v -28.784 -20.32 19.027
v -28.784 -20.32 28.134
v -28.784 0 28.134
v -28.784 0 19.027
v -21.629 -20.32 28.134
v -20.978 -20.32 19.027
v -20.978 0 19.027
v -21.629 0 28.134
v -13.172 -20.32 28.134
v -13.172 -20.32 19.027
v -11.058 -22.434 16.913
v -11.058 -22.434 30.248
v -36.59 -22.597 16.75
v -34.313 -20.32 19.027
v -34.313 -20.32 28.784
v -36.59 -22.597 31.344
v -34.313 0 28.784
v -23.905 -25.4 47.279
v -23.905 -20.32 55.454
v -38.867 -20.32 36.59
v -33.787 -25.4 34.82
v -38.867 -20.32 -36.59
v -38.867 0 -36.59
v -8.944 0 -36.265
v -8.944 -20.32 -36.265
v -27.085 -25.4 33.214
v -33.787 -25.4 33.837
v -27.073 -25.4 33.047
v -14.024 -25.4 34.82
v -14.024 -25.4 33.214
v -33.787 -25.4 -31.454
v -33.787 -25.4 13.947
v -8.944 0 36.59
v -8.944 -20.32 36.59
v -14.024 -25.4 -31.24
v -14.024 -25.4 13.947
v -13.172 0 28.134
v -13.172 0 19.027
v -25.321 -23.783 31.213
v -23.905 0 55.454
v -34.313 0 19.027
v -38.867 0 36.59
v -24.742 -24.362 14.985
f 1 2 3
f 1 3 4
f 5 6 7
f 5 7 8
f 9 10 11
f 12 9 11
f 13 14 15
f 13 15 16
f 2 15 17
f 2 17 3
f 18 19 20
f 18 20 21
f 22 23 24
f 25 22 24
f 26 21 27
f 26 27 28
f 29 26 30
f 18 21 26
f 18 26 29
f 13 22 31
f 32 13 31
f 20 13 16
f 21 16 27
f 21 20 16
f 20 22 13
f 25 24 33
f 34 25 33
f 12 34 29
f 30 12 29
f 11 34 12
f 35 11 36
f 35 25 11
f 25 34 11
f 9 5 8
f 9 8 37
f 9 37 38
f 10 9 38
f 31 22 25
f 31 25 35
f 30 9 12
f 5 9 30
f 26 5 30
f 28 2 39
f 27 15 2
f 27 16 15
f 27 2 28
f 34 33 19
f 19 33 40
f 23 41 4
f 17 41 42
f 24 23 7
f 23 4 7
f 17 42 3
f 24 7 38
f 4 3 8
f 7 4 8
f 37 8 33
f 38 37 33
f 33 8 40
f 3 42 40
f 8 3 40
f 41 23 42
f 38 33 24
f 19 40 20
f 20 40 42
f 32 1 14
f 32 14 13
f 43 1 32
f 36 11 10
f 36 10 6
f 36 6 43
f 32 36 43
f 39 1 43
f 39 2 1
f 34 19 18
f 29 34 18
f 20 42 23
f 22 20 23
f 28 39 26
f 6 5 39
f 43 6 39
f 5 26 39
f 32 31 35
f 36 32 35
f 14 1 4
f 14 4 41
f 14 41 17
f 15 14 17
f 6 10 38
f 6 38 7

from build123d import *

# Parameters (mm, degrees)
F1_DEPTH      = 25.4
F2_T1_DEPTH   = 5.5291503668
F2_T3_DEPTH   = 9.1068297625
F2_T8_DEPTH   = 98.9829335321
F2_T14_DEPTH  = 50.2051374371
F2_T20_DEPTH  = 50.2051368583
F2_T26_DEPTH  = 99.3081774522
F2_T32_DEPTH  = 56.0525045898
F2_T38_DEPTH  = 22.8214690441
F2_T43_DEPTH  = 31.6955822143
F2_T49_DEPTH  = 22.1709793413
F2_T54_DEPTH  = 35.2583310718
F2_T60_DEPTH  = 21.5204924325
F2_T65_DEPTH  = 20.8700045923
F2_T71_DEPTH  = 98.9829335321
F2_T75_DEPTH  = 56.0525045898
F2_T82_DEPTH  = 98.9829335321
F2_T86_DEPTH  = 50.2051374371
F2_T93_DEPTH  = 50.2051374371
F2_T97_DEPTH  = 50.2051368583
F2_T104_DEPTH = 50.2051368583
F2_T108_DEPTH = 99.3081774522
F2_T115_DEPTH = 99.3081774522
F2_T119_DEPTH = 56.0525045898
F2_T126_DEPTH = 35.885618623
F2_T130_DEPTH = 18.5932999456
F2_T137_DEPTH = 22.8214690441
F2_T141_DEPTH = 31.6955822143
F2_T148_DEPTH = 31.6955822143
F2_T152_DEPTH = 22.1709793413
F2_T159_DEPTH = 35.2351289202
F2_T163_DEPTH = 18.5932999456
F2_T170_DEPTH = 35.2583310718
F2_T174_DEPTH = 20.8700045923
F2_T181_DEPTH = 35.2583310718
F2_T185_DEPTH = 21.5204924325
F2_T192_DEPTH = 34.5846420113
F2_T196_DEPTH = 22.1709793413
F2_T203_DEPTH = 22.1709793413
F2_T207_DEPTH = 33.9341541712
F3_R          = 2.4287646607
F4_DEPTH      = 25.4


# Not quite as in the source:
# - a fillet or chamfer that OpenCascade refuses, or shapes differently, is made with other operations: its cross-section is extruded or revolved along the edge and cut away or added


with BuildPart() as f1:
    # F0 (on Front) → F1 (new body)
    with BuildSketch(Plane.XZ):
        Polygon((-38.8666465878, 36.5899391472), (-38.8666465878, -36.5899391472), (-8.9442087337, -36.2646952271), (-8.9442087337, 36.5899391472), align=None)
        Polygon((-34.3132354319, 19.0267674625), (-34.3132354319, 28.7840869278), (-28.7840850651, 28.133597225), (-28.7840850651, 19.0267674625), align=None, mode=Mode.SUBTRACT)
        Polygon((-20.9782328457, 19.0267674625), (-21.6287206858, 28.133597225), (-13.1723778322, 28.133597225), (-13.1723778322, 19.0267674625), align=None, mode=Mode.SUBTRACT)
        Polygon((-23.9054281265, 55.4540865123), (-38.8666465878, 36.5899391472), (-8.9442087337, 36.5899391472), align=None)
    extrude(amount=F1_DEPTH)

    # F2: chamfer of 5.08 on 13 edges, made by hand

    # F2_s2 → F2_t1 (cut)
    with BuildSketch(Plane.YZ.offset(-34.3132354319)):
        with BuildLine():
            Line((-20.1763159021, 19.1704515604), (-25.5436840979, 13.8030833646))
            Line((-25.5436840979, 13.8030833646), (-25.6452840979, 13.8030833646))
            ThreePointArc((-25.6452840979, 13.8030833646), (-25.5016, 16.4149254135), (-25.5016, 19.0267674625))
            Line((-25.5016, 19.0267674625), (-25.4, 19.1283674625))
            ThreePointArc((-25.4, 19.1283674625), (-22.788157951, 19.1283674625), (-20.1763159021, 19.2720515604))
            Line((-20.1763159021, 19.2720515604), (-20.1763159021, 19.1704515604))
        make_face()
    extrude(amount=F2_T1_DEPTH, mode=Mode.SUBTRACT)

    # F2_s4 → F2_t3 (cut)
    with BuildSketch(Plane.XY.offset(19.0267674625)):
        with BuildLine():
            Line((-13.3160619302, -20.1763159021), (-7.9486937343, -25.5436840979))
            Line((-7.9486937343, -25.5436840979), (-7.9486937343, -25.6452840979))
            ThreePointArc((-7.9486937343, -25.6452840979), (-10.5605357833, -25.5016), (-13.1723778322, -25.5016))
            Line((-13.1723778322, -25.5016), (-13.2739778322, -25.4))
            ThreePointArc((-13.2739778322, -25.4), (-13.2739778322, -22.788157951), (-13.4176619302, -20.1763159021))
            Line((-13.4176619302, -20.1763159021), (-13.3160619302, -20.1763159021))
        make_face()
    extrude(amount=F2_T3_DEPTH, mode=Mode.SUBTRACT)


with BuildPart() as f2_tool6:
    # F2_s7 → F2_t8 (new body)
    with BuildSketch(Plane.XY.offset(-49.328844806)):
        with BuildLine():
            Line((-8.8005246358, -20.1763159021), (-14.1678928317, -25.5436840979))
            Line((-14.1678928317, -25.5436840979), (-14.1678928317, -25.6452840979))
            ThreePointArc((-14.1678928317, -25.6452840979), (-11.5560507827, -25.5016), (-8.9442087337, -25.5016))
            Line((-8.9442087337, -25.5016), (-8.8426087337, -25.4))
            ThreePointArc((-8.8426087337, -25.4), (-8.8426087337, -22.788157951), (-8.6989246358, -20.1763159021))
            Line((-8.6989246358, -20.1763159021), (-8.8005246358, -20.1763159021))
        make_face()
    extrude(amount=F2_T8_DEPTH)

    split(bisect_by=Plane(origin=(0.3930783298, 0, -36.163202967), x_dir=(0, 1, 0), z_dir=(-0.0108689242, 0, 0.9999409315)), keep=Keep.TOP)

    split(bisect_by=Plane(origin=(12.3236563201, 0, 9.7739337144), x_dir=(0, 1, 0), z_dir=(-0.7834976979, 0, -0.6213946873)), keep=Keep.TOP)


with BuildPart() as f1_1:
    add(f1.part)

    # F2_t5: cut F2_tool6
    add(f2_tool6.part, mode=Mode.SUBTRACT)


with BuildPart() as f2_tool12:
    # F2_s13 → F2_t14 (new body)
    with BuildSketch(Plane(origin=(-13.149871912, 0, 16.5802743125), x_dir=(0, 1, 0), z_dir=(-0.6213946873, 0, 0.7834976979))):
        with BuildLine():
            Line((-20.1763159021, -15.8727109385), (-25.5436840979, -10.5053427426))
            Line((-25.5436840979, -10.5053427426), (-25.6452840979, -10.5053427426))
            ThreePointArc((-25.6452840979, -10.5053427426), (-25.5016, -13.1171847916), (-25.5016, -15.7290268405))
            Line((-25.5016, -15.7290268405), (-25.4, -15.8306268405))
            ThreePointArc((-25.4, -15.8306268405), (-22.788157951, -15.8306268405), (-20.1763159021, -15.9743109385))
            Line((-20.1763159021, -15.9743109385), (-20.1763159021, -15.8727109385))
        make_face()
    extrude(amount=F2_T14_DEPTH)

    split(bisect_by=Plane.YZ.offset(-8.9442087337), keep=Keep.BOTTOM)

    split(bisect_by=Plane(origin=(-41.6732420747, 0, 33.0511878754), x_dir=(0, 1, 0), z_dir=(0.7834977168, 0, -0.6213946635)), keep=Keep.TOP)


with BuildPart() as f1_2:
    add(f1_1.part)

    # F2_t11: cut F2_tool12
    add(f2_tool12.part, mode=Mode.SUBTRACT)


with BuildPart() as f2_tool18:
    # F2_s19 → F2_t20 (new body)
    with BuildSketch(Plane(origin=(25.8858067798, 0, 32.6386300033), x_dir=(0, 1, 0), z_dir=(-0.6213946635, 0, -0.7834977168))):
        with BuildLine():
            Line((-20.1763159021, -53.3324058817), (-25.5436840979, -47.9650376858))
            Line((-25.5436840979, -47.9650376858), (-25.6452840979, -47.9650376858))
            ThreePointArc((-25.6452840979, -47.9650376858), (-25.5016, -50.5768797348), (-25.5016, -53.1887217838))
            Line((-25.5016, -53.1887217838), (-25.4, -53.2903217838))
            ThreePointArc((-25.4, -53.2903217838), (-22.788157951, -53.2903217838), (-20.1763159021, -53.4340058817))
            Line((-20.1763159021, -53.4340058817), (-20.1763159021, -53.3324058817))
        make_face()
    extrude(amount=F2_T20_DEPTH)

    split(bisect_by=Plane(origin=(12.3236563201, 0, 9.7739337144), x_dir=(0, 1, 0), z_dir=(-0.7834976979, 0, -0.6213946873)), keep=Keep.TOP)

    split(bisect_by=Plane.YZ.offset(-38.8666465878), keep=Keep.TOP)


with BuildPart() as f1_3:
    add(f1_2.part)

    # F2_t17: cut F2_tool18
    add(f2_tool18.part, mode=Mode.SUBTRACT)


with BuildPart() as f2_tool24:
    # F2_s25 → F2_t26 (new body)
    with BuildSketch(Plane.XY.offset(49.6540887261)):
        with BuildLine():
            Line((-39.0103306858, -20.1763159021), (-33.6429624899, -25.5436840979))
            Line((-33.6429624899, -25.5436840979), (-33.6429624899, -25.6452840979))
            ThreePointArc((-33.6429624899, -25.6452840979), (-36.2548045389, -25.5016), (-38.8666465878, -25.5016))
            Line((-38.8666465878, -25.5016), (-38.9682465878, -25.4))
            ThreePointArc((-38.9682465878, -25.4), (-38.9682465878, -22.788157951), (-39.1119306858, -20.1763159021))
            Line((-39.1119306858, -20.1763159021), (-39.0103306858, -20.1763159021))
        make_face()
    extrude(amount=-F2_T26_DEPTH)

    split(bisect_by=Plane(origin=(-41.6732420747, 0, 33.0511878754), x_dir=(0, 1, 0), z_dir=(0.7834977168, 0, -0.6213946635)), keep=Keep.TOP)

    split(bisect_by=Plane(origin=(0.3930783298, 0, -36.163202967), x_dir=(0, 1, 0), z_dir=(-0.0108689242, 0, 0.9999409315)), keep=Keep.TOP)


with BuildPart() as f1_4:
    add(f1_3.part)

    # F2_t23: cut F2_tool24
    add(f2_tool24.part, mode=Mode.SUBTRACT)


with BuildPart() as f2_tool30:
    # F2_s31 → F2_t32 (new body)
    with BuildSketch(Plane(origin=(-52.3231028168, 0, -0.5687294315), x_dir=(0, 1, 0), z_dir=(0.9999409315, 0, 0.0108689242))):
        with BuildLine():
            Line((-20.1763159021, -36.3090232973), (-25.5436840979, -30.9416551014))
            Line((-25.5436840979, -30.9416551014), (-25.6452840979, -30.9416551014))
            ThreePointArc((-25.6452840979, -30.9416551014), (-25.5016, -33.5534971504), (-25.5016, -36.1653391994))
            Line((-25.5016, -36.1653391994), (-25.4, -36.2669391994))
            ThreePointArc((-25.4, -36.2669391994), (-22.788157951, -36.2669391994), (-20.1763159021, -36.4106232973))
            Line((-20.1763159021, -36.4106232973), (-20.1763159021, -36.3090232973))
        make_face()
    extrude(amount=F2_T32_DEPTH)

    split(bisect_by=Plane.YZ.offset(-8.9442087337), keep=Keep.BOTTOM)

    split(bisect_by=Plane.YZ.offset(-38.8666465878), keep=Keep.TOP)


with BuildPart() as f1_5:
    add(f1_4.part)

    # F2_t29: cut F2_tool30
    add(f2_tool30.part, mode=Mode.SUBTRACT)


with BuildPart() as f2_tool36:
    # F2_s37 → F2_t38 (new body)
    with BuildSketch(Plane.XY.offset(19.0267674625)):
        with BuildLine():
            Line((-34.169551334, -20.1763159021), (-39.5369195298, -25.5436840979))
            Line((-39.5369195298, -25.5436840979), (-39.5369195298, -25.6452840979))
            ThreePointArc((-39.5369195298, -25.6452840979), (-36.9250774809, -25.5016), (-34.3132354319, -25.5016))
            Line((-34.3132354319, -25.5016), (-34.2116354319, -25.4))
            ThreePointArc((-34.2116354319, -25.4), (-34.2116354319, -22.788157951), (-34.067951334, -20.1763159021))
            Line((-34.067951334, -20.1763159021), (-34.169551334, -20.1763159021))
        make_face()
    extrude(amount=F2_T38_DEPTH)

    split(bisect_by=Plane(origin=(2.8716979706, 0, 24.4093793011), x_dir=(0, 1, 0), z_dir=(-0.1168414999, 0, -0.9931505746)), keep=Keep.TOP)


with BuildPart() as f1_6:
    add(f1_5.part)

    # F2_t35: cut F2_tool36
    add(f2_tool36.part, mode=Mode.SUBTRACT)


with BuildPart() as f2_tool41:
    # F2_s42 → F2_t43 (new body)
    with BuildSketch(Plane(origin=(-50.1596010639, 0, 5.9011424586), x_dir=(0, 1, 0), z_dir=(0.9931505746, 0, -0.1168414999))):
        with BuildLine():
            Line((-20.1763159021, 24.4340384796), (-25.5436840979, 29.8014066755))
            Line((-25.5436840979, 29.8014066755), (-25.6452840979, 29.8014066755))
            ThreePointArc((-25.6452840979, 29.8014066755), (-25.5016, 27.1895646266), (-25.5016, 24.5777225776))
            Line((-25.5016, 24.5777225776), (-25.4, 24.4761225776))
            ThreePointArc((-25.4, 24.4761225776), (-22.788157951, 24.4761225776), (-20.1763159021, 24.3324384796))
            Line((-20.1763159021, 24.3324384796), (-20.1763159021, 24.4340384796))
        make_face()
    extrude(amount=F2_T43_DEPTH)

    split(bisect_by=Plane.YZ.offset(-34.3132354319), keep=Keep.TOP)

    split(bisect_by=Plane.YZ.offset(-28.7840850651), keep=Keep.BOTTOM)


with BuildPart() as f1_7:
    add(f1_6.part)

    # F2_t40: cut F2_tool41
    add(f2_tool41.part, mode=Mode.SUBTRACT)


with BuildPart() as f2_tool47:
    # F2_s48 → F2_t49 (new body)
    with BuildSketch(Plane.XY.offset(41.1977468038)):
        with BuildLine():
            Line((-28.9277691631, -20.1763159021), (-23.5604009672, -25.5436840979))
            Line((-23.5604009672, -25.5436840979), (-23.5604009672, -25.6452840979))
            ThreePointArc((-23.5604009672, -25.6452840979), (-26.1722430162, -25.5016), (-28.7840850651, -25.5016))
            Line((-28.7840850651, -25.5016), (-28.8856850651, -25.4))
            ThreePointArc((-28.8856850651, -25.4), (-28.8856850651, -22.788157951), (-29.0293691631, -20.1763159021))
            Line((-29.0293691631, -20.1763159021), (-28.9277691631, -20.1763159021))
        make_face()
    extrude(amount=-F2_T49_DEPTH)

    split(bisect_by=Plane(origin=(2.8716979706, 0, 24.4093793011), x_dir=(0, 1, 0), z_dir=(-0.1168414999, 0, -0.9931505746)), keep=Keep.TOP)


with BuildPart() as f1_8:
    add(f1_7.part)

    # F2_t46: cut F2_tool47
    add(f2_tool47.part, mode=Mode.SUBTRACT)


with BuildPart() as f2_tool52:
    # F2_s53 → F2_t54 (new body)
    with BuildSketch(Plane(origin=(-0.5278624368, 0, 7.3900741156), x_dir=(0, 1, 0), z_dir=(-0.07124705, 0, 0.9974586998))):
        with BuildLine():
            Line((-20.1763159021, 19.4256357085), (-25.5436840979, 24.7930039044))
            Line((-25.5436840979, 24.7930039044), (-25.6452840979, 24.7930039044))
            ThreePointArc((-25.6452840979, 24.7930039044), (-25.5016, 22.1811618554), (-25.5016, 19.5693198065))
            Line((-25.5016, 19.5693198065), (-25.4, 19.4677198065))
            ThreePointArc((-25.4, 19.4677198065), (-22.788157951, 19.4677198065), (-20.1763159021, 19.3240357085))
            Line((-20.1763159021, 19.3240357085), (-20.1763159021, 19.4256357085))
        make_face()
    extrude(amount=F2_T54_DEPTH)

    split(bisect_by=Plane.XY.offset(19.0267674625), keep=Keep.TOP)

    split(bisect_by=Plane.XY.offset(28.133597225), keep=Keep.BOTTOM)


with BuildPart() as f1_9:
    add(f1_8.part)

    # F2_t51: cut F2_tool52
    add(f2_tool52.part, mode=Mode.SUBTRACT)


with BuildPart() as f2_tool58:
    # F2_s59 → F2_t60 (new body)
    with BuildSketch(Plane.YZ.offset(-34.6928702647)):
        with BuildLine():
            Line((-20.1763159021, 27.989913127), (-25.5436840979, 33.3572813229))
            Line((-25.5436840979, 33.3572813229), (-25.6452840979, 33.3572813229))
            ThreePointArc((-25.6452840979, 33.3572813229), (-25.5016, 30.7454392739), (-25.5016, 28.133597225))
            Line((-25.5016, 28.133597225), (-25.4, 28.031997225))
            ThreePointArc((-25.4, 28.031997225), (-22.788157951, 28.031997225), (-20.1763159021, 27.888313127))
            Line((-20.1763159021, 27.888313127), (-20.1763159021, 27.989913127))
        make_face()
    extrude(amount=F2_T60_DEPTH)

    split(bisect_by=Plane(origin=(-19.5195882907, 0, -1.3942563065), x_dir=(0, 1, 0), z_dir=(0.9974586998, 0, 0.07124705)), keep=Keep.TOP)


with BuildPart() as f1_10:
    add(f1_9.part)

    # F2_t57: cut F2_tool58
    add(f2_tool58.part, mode=Mode.SUBTRACT)


with BuildPart() as f2_tool63:
    # F2_s64 → F2_t65 (new body)
    with BuildSketch(Plane.YZ.offset(-13.1723778322)):
        with BuildLine():
            Line((-20.1763159021, 19.1704515604), (-25.5436840979, 13.8030833646))
            Line((-25.5436840979, 13.8030833646), (-25.6452840979, 13.8030833646))
            ThreePointArc((-25.6452840979, 13.8030833646), (-25.5016, 16.4149254135), (-25.5016, 19.0267674625))
            Line((-25.5016, 19.0267674625), (-25.4, 19.1283674625))
            ThreePointArc((-25.4, 19.1283674625), (-22.788157951, 19.1283674625), (-20.1763159021, 19.2720515604))
            Line((-20.1763159021, 19.2720515604), (-20.1763159021, 19.1704515604))
        make_face()
    extrude(amount=-F2_T65_DEPTH)

    split(bisect_by=Plane(origin=(-19.5195882907, 0, -1.3942563065), x_dir=(0, 1, 0), z_dir=(0.9974586998, 0, 0.07124705)), keep=Keep.TOP)


with BuildPart() as f1_11:
    add(f1_10.part)

    # F2_t62: cut F2_tool63
    add(f2_tool63.part, mode=Mode.SUBTRACT)


with BuildPart() as f2_tool69:
    # F2_s70 → F2_t71 (new body)
    with BuildSketch(Plane.XY.offset(-49.328844806)):
        with BuildLine():
            Line((-8.8005246358, -20.1763159021), (-14.1678928317, -25.5436840979))
            Line((-14.1678928317, -25.5436840979), (-14.1678928317, -25.6452840979))
            ThreePointArc((-14.1678928317, -25.6452840979), (-11.5560507827, -25.5016), (-8.9442087337, -25.5016))
            Line((-8.9442087337, -25.5016), (-8.8426087337, -25.4))
            ThreePointArc((-8.8426087337, -25.4), (-8.8426087337, -22.788157951), (-8.6989246358, -20.1763159021))
            Line((-8.6989246358, -20.1763159021), (-8.8005246358, -20.1763159021))
        make_face()
    extrude(amount=F2_T71_DEPTH)

    split(bisect_by=Plane(origin=(0.3930783298, 0, -36.163202967), x_dir=(0, 1, 0), z_dir=(0.0108689242, 0, -0.9999409315)), keep=Keep.TOP)


with BuildPart() as f2_tool73:
    # F2_s74 → F2_t75 (new body)
    with BuildSketch(Plane(origin=(-52.3231028168, 0, -0.5687294315), x_dir=(0, 1, 0), z_dir=(0.9999409315, 0, 0.0108689242))):
        with BuildLine():
            Line((-20.1763159021, -36.3090232973), (-25.5436840979, -30.9416551014))
            Line((-25.5436840979, -30.9416551014), (-25.6452840979, -30.9416551014))
            ThreePointArc((-25.6452840979, -30.9416551014), (-25.5016, -33.5534971504), (-25.5016, -36.1653391994))
            Line((-25.5016, -36.1653391994), (-25.4, -36.2669391994))
            ThreePointArc((-25.4, -36.2669391994), (-22.788157951, -36.2669391994), (-20.1763159021, -36.4106232973))
            Line((-20.1763159021, -36.4106232973), (-20.1763159021, -36.3090232973))
        make_face()
    extrude(amount=F2_T75_DEPTH)

    split(bisect_by=Plane.YZ.offset(-8.9442087337), keep=Keep.TOP)


with BuildPart() as f2_tool69_1:
    add(f2_tool69.part)

    # F2_t77: intersect F2_tool73
    add(f2_tool73.part, mode=Mode.INTERSECT)


with BuildPart() as f1_12:
    add(f1_11.part)

    # F2_t67: cut F2_tool69
    add(f2_tool69_1.part, mode=Mode.SUBTRACT)


with BuildPart() as f2_tool80:
    # F2_s81 → F2_t82 (new body)
    with BuildSketch(Plane.XY.offset(-49.328844806)):
        with BuildLine():
            Line((-8.8005246358, -20.1763159021), (-14.1678928317, -25.5436840979))
            Line((-14.1678928317, -25.5436840979), (-14.1678928317, -25.6452840979))
            ThreePointArc((-14.1678928317, -25.6452840979), (-11.5560507827, -25.5016), (-8.9442087337, -25.5016))
            Line((-8.9442087337, -25.5016), (-8.8426087337, -25.4))
            ThreePointArc((-8.8426087337, -25.4), (-8.8426087337, -22.788157951), (-8.6989246358, -20.1763159021))
            Line((-8.6989246358, -20.1763159021), (-8.8005246358, -20.1763159021))
        make_face()
    extrude(amount=F2_T82_DEPTH)

    split(bisect_by=Plane(origin=(12.3236563201, 0, 9.7739337144), x_dir=(0, 1, 0), z_dir=(0.7834976979, 0, 0.6213946873)), keep=Keep.TOP)


with BuildPart() as f2_tool84:
    # F2_s85 → F2_t86 (new body)
    with BuildSketch(Plane(origin=(-13.149871912, 0, 16.5802743125), x_dir=(0, 1, 0), z_dir=(-0.6213946873, 0, 0.7834976979))):
        with BuildLine():
            Line((-20.1763159021, -15.8727109385), (-25.5436840979, -10.5053427426))
            Line((-25.5436840979, -10.5053427426), (-25.6452840979, -10.5053427426))
            ThreePointArc((-25.6452840979, -10.5053427426), (-25.5016, -13.1171847916), (-25.5016, -15.7290268405))
            Line((-25.5016, -15.7290268405), (-25.4, -15.8306268405))
            ThreePointArc((-25.4, -15.8306268405), (-22.788157951, -15.8306268405), (-20.1763159021, -15.9743109385))
            Line((-20.1763159021, -15.9743109385), (-20.1763159021, -15.8727109385))
        make_face()
    extrude(amount=F2_T86_DEPTH)

    split(bisect_by=Plane.YZ.offset(-8.9442087337), keep=Keep.TOP)


with BuildPart() as f2_tool80_1:
    add(f2_tool80.part)

    # F2_t88: intersect F2_tool84
    add(f2_tool84.part, mode=Mode.INTERSECT)


with BuildPart() as f1_13:
    add(f1_12.part)

    # F2_t78: cut F2_tool80
    add(f2_tool80_1.part, mode=Mode.SUBTRACT)


with BuildPart() as f2_tool91:
    # F2_s92 → F2_t93 (new body)
    with BuildSketch(Plane(origin=(-13.149871912, 0, 16.5802743125), x_dir=(0, 1, 0), z_dir=(-0.6213946873, 0, 0.7834976979))):
        with BuildLine():
            Line((-20.1763159021, -15.8727109385), (-25.5436840979, -10.5053427426))
            Line((-25.5436840979, -10.5053427426), (-25.6452840979, -10.5053427426))
            ThreePointArc((-25.6452840979, -10.5053427426), (-25.5016, -13.1171847916), (-25.5016, -15.7290268405))
            Line((-25.5016, -15.7290268405), (-25.4, -15.8306268405))
            ThreePointArc((-25.4, -15.8306268405), (-22.788157951, -15.8306268405), (-20.1763159021, -15.9743109385))
            Line((-20.1763159021, -15.9743109385), (-20.1763159021, -15.8727109385))
        make_face()
    extrude(amount=F2_T93_DEPTH)

    split(bisect_by=Plane(origin=(-41.6732420747, 0, 33.0511878754), x_dir=(0, 1, 0), z_dir=(-0.7834977168, 0, 0.6213946635)), keep=Keep.TOP)


with BuildPart() as f2_tool95:
    # F2_s96 → F2_t97 (new body)
    with BuildSketch(Plane(origin=(25.8858067798, 0, 32.6386300033), x_dir=(0, 1, 0), z_dir=(-0.6213946635, 0, -0.7834977168))):
        with BuildLine():
            Line((-20.1763159021, -53.3324058817), (-25.5436840979, -47.9650376858))
            Line((-25.5436840979, -47.9650376858), (-25.6452840979, -47.9650376858))
            ThreePointArc((-25.6452840979, -47.9650376858), (-25.5016, -50.5768797348), (-25.5016, -53.1887217838))
            Line((-25.5016, -53.1887217838), (-25.4, -53.2903217838))
            ThreePointArc((-25.4, -53.2903217838), (-22.788157951, -53.2903217838), (-20.1763159021, -53.4340058817))
            Line((-20.1763159021, -53.4340058817), (-20.1763159021, -53.3324058817))
        make_face()
    extrude(amount=F2_T97_DEPTH)

    split(bisect_by=Plane(origin=(12.3236563201, 0, 9.7739337144), x_dir=(0, 1, 0), z_dir=(0.7834976979, 0, 0.6213946873)), keep=Keep.TOP)


with BuildPart() as f2_tool91_1:
    add(f2_tool91.part)

    # F2_t99: intersect F2_tool95
    add(f2_tool95.part, mode=Mode.INTERSECT)


with BuildPart() as f1_14:
    add(f1_13.part)

    # F2_t89: cut F2_tool91
    add(f2_tool91_1.part, mode=Mode.SUBTRACT)


with BuildPart() as f2_tool102:
    # F2_s103 → F2_t104 (new body)
    with BuildSketch(Plane(origin=(25.8858067798, 0, 32.6386300033), x_dir=(0, 1, 0), z_dir=(-0.6213946635, 0, -0.7834977168))):
        with BuildLine():
            Line((-20.1763159021, -53.3324058817), (-25.5436840979, -47.9650376858))
            Line((-25.5436840979, -47.9650376858), (-25.6452840979, -47.9650376858))
            ThreePointArc((-25.6452840979, -47.9650376858), (-25.5016, -50.5768797348), (-25.5016, -53.1887217838))
            Line((-25.5016, -53.1887217838), (-25.4, -53.2903217838))
            ThreePointArc((-25.4, -53.2903217838), (-22.788157951, -53.2903217838), (-20.1763159021, -53.4340058817))
            Line((-20.1763159021, -53.4340058817), (-20.1763159021, -53.3324058817))
        make_face()
    extrude(amount=F2_T104_DEPTH)

    split(bisect_by=Plane.YZ.offset(-38.8666465878), keep=Keep.BOTTOM)


with BuildPart() as f2_tool106:
    # F2_s107 → F2_t108 (new body)
    with BuildSketch(Plane.XY.offset(49.6540887261)):
        with BuildLine():
            Line((-39.0103306858, -20.1763159021), (-33.6429624899, -25.5436840979))
            Line((-33.6429624899, -25.5436840979), (-33.6429624899, -25.6452840979))
            ThreePointArc((-33.6429624899, -25.6452840979), (-36.2548045389, -25.5016), (-38.8666465878, -25.5016))
            Line((-38.8666465878, -25.5016), (-38.9682465878, -25.4))
            ThreePointArc((-38.9682465878, -25.4), (-38.9682465878, -22.788157951), (-39.1119306858, -20.1763159021))
            Line((-39.1119306858, -20.1763159021), (-39.0103306858, -20.1763159021))
        make_face()
    extrude(amount=-F2_T108_DEPTH)

    split(bisect_by=Plane(origin=(-41.6732420747, 0, 33.0511878754), x_dir=(0, 1, 0), z_dir=(-0.7834977168, 0, 0.6213946635)), keep=Keep.TOP)


with BuildPart() as f2_tool102_1:
    add(f2_tool102.part)

    # F2_t110: intersect F2_tool106
    add(f2_tool106.part, mode=Mode.INTERSECT)


with BuildPart() as f1_15:
    add(f1_14.part)

    # F2_t100: cut F2_tool102
    add(f2_tool102_1.part, mode=Mode.SUBTRACT)


with BuildPart() as f2_tool113:
    # F2_s114 → F2_t115 (new body)
    with BuildSketch(Plane.XY.offset(49.6540887261)):
        with BuildLine():
            Line((-39.0103306858, -20.1763159021), (-33.6429624899, -25.5436840979))
            Line((-33.6429624899, -25.5436840979), (-33.6429624899, -25.6452840979))
            ThreePointArc((-33.6429624899, -25.6452840979), (-36.2548045389, -25.5016), (-38.8666465878, -25.5016))
            Line((-38.8666465878, -25.5016), (-38.9682465878, -25.4))
            ThreePointArc((-38.9682465878, -25.4), (-38.9682465878, -22.788157951), (-39.1119306858, -20.1763159021))
            Line((-39.1119306858, -20.1763159021), (-39.0103306858, -20.1763159021))
        make_face()
    extrude(amount=-F2_T115_DEPTH)

    split(bisect_by=Plane(origin=(0.3930783298, 0, -36.163202967), x_dir=(0, 1, 0), z_dir=(0.0108689242, 0, -0.9999409315)), keep=Keep.TOP)


with BuildPart() as f2_tool117:
    # F2_s118 → F2_t119 (new body)
    with BuildSketch(Plane(origin=(-52.3231028168, 0, -0.5687294315), x_dir=(0, 1, 0), z_dir=(0.9999409315, 0, 0.0108689242))):
        with BuildLine():
            Line((-20.1763159021, -36.3090232973), (-25.5436840979, -30.9416551014))
            Line((-25.5436840979, -30.9416551014), (-25.6452840979, -30.9416551014))
            ThreePointArc((-25.6452840979, -30.9416551014), (-25.5016, -33.5534971504), (-25.5016, -36.1653391994))
            Line((-25.5016, -36.1653391994), (-25.4, -36.2669391994))
            ThreePointArc((-25.4, -36.2669391994), (-22.788157951, -36.2669391994), (-20.1763159021, -36.4106232973))
            Line((-20.1763159021, -36.4106232973), (-20.1763159021, -36.3090232973))
        make_face()
    extrude(amount=F2_T119_DEPTH)

    split(bisect_by=Plane.YZ.offset(-38.8666465878), keep=Keep.BOTTOM)


with BuildPart() as f2_tool113_1:
    add(f2_tool113.part)

    # F2_t121: intersect F2_tool117
    add(f2_tool117.part, mode=Mode.INTERSECT)


with BuildPart() as f1_16:
    add(f1_15.part)

    # F2_t111: cut F2_tool113
    add(f2_tool113_1.part, mode=Mode.SUBTRACT)


with BuildPart() as f2_tool124:
    # F2_s125 → F2_t126 (new body)
    with BuildSketch(Plane.XY.offset(5.9626178836)):
        with BuildLine():
            Line((-34.169551334, -20.1763159021), (-39.5369195298, -25.5436840979))
            Line((-39.5369195298, -25.5436840979), (-39.5369195298, -25.6452840979))
            ThreePointArc((-39.5369195298, -25.6452840979), (-36.9250774809, -25.5016), (-34.3132354319, -25.5016))
            Line((-34.3132354319, -25.5016), (-34.2116354319, -25.4))
            ThreePointArc((-34.2116354319, -25.4), (-34.2116354319, -22.788157951), (-34.067951334, -20.1763159021))
            Line((-34.067951334, -20.1763159021), (-34.169551334, -20.1763159021))
        make_face()
    extrude(amount=F2_T126_DEPTH)

    split(bisect_by=Plane.XY.offset(19.0267674625), keep=Keep.BOTTOM)


with BuildPart() as f2_tool128:
    # F2_s129 → F2_t130 (new body)
    with BuildSketch(Plane.YZ.offset(-28.7840850651)):
        with BuildLine():
            Line((-20.1763159021, 19.1704515604), (-25.5436840979, 13.8030833646))
            Line((-25.5436840979, 13.8030833646), (-25.6452840979, 13.8030833646))
            ThreePointArc((-25.6452840979, 13.8030833646), (-25.5016, 16.4149254135), (-25.5016, 19.0267674625))
            Line((-25.5016, 19.0267674625), (-25.4, 19.1283674625))
            ThreePointArc((-25.4, 19.1283674625), (-22.788157951, 19.1283674625), (-20.1763159021, 19.2720515604))
            Line((-20.1763159021, 19.2720515604), (-20.1763159021, 19.1704515604))
        make_face()
    extrude(amount=-F2_T130_DEPTH)

    split(bisect_by=Plane.YZ.offset(-34.3132354319), keep=Keep.BOTTOM)


with BuildPart() as f2_tool124_1:
    add(f2_tool124.part)

    # F2_t132: intersect F2_tool128
    add(f2_tool128.part, mode=Mode.INTERSECT)


with BuildPart() as f1_17:
    add(f1_16.part)

    # F2_t122: cut F2_tool124
    add(f2_tool124_1.part, mode=Mode.SUBTRACT)


with BuildPart() as f2_tool135:
    # F2_s136 → F2_t137 (new body)
    with BuildSketch(Plane.XY.offset(19.0267674625)):
        with BuildLine():
            Line((-34.169551334, -20.1763159021), (-39.5369195298, -25.5436840979))
            Line((-39.5369195298, -25.5436840979), (-39.5369195298, -25.6452840979))
            ThreePointArc((-39.5369195298, -25.6452840979), (-36.9250774809, -25.5016), (-34.3132354319, -25.5016))
            Line((-34.3132354319, -25.5016), (-34.2116354319, -25.4))
            ThreePointArc((-34.2116354319, -25.4), (-34.2116354319, -22.788157951), (-34.067951334, -20.1763159021))
            Line((-34.067951334, -20.1763159021), (-34.169551334, -20.1763159021))
        make_face()
    extrude(amount=F2_T137_DEPTH)

    split(bisect_by=Plane(origin=(2.8716979706, 0, 24.4093793011), x_dir=(0, 1, 0), z_dir=(0.1168414999, 0, 0.9931505746)), keep=Keep.TOP)


with BuildPart() as f2_tool139:
    # F2_s140 → F2_t141 (new body)
    with BuildSketch(Plane(origin=(-50.1596010639, 0, 5.9011424586), x_dir=(0, 1, 0), z_dir=(0.9931505746, 0, -0.1168414999))):
        with BuildLine():
            Line((-20.1763159021, 24.4340384796), (-25.5436840979, 29.8014066755))
            Line((-25.5436840979, 29.8014066755), (-25.6452840979, 29.8014066755))
            ThreePointArc((-25.6452840979, 29.8014066755), (-25.5016, 27.1895646266), (-25.5016, 24.5777225776))
            Line((-25.5016, 24.5777225776), (-25.4, 24.4761225776))
            ThreePointArc((-25.4, 24.4761225776), (-22.788157951, 24.4761225776), (-20.1763159021, 24.3324384796))
            Line((-20.1763159021, 24.3324384796), (-20.1763159021, 24.4340384796))
        make_face()
    extrude(amount=F2_T141_DEPTH)

    split(bisect_by=Plane.YZ.offset(-34.3132354319), keep=Keep.BOTTOM)


with BuildPart() as f2_tool135_1:
    add(f2_tool135.part)

    # F2_t143: intersect F2_tool139
    add(f2_tool139.part, mode=Mode.INTERSECT)


with BuildPart() as f1_18:
    add(f1_17.part)

    # F2_t133: cut F2_tool135
    add(f2_tool135_1.part, mode=Mode.SUBTRACT)


with BuildPart() as f2_tool146:
    # F2_s147 → F2_t148 (new body)
    with BuildSketch(Plane(origin=(-50.1596010639, 0, 5.9011424586), x_dir=(0, 1, 0), z_dir=(0.9931505746, 0, -0.1168414999))):
        with BuildLine():
            Line((-20.1763159021, 24.4340384796), (-25.5436840979, 29.8014066755))
            Line((-25.5436840979, 29.8014066755), (-25.6452840979, 29.8014066755))
            ThreePointArc((-25.6452840979, 29.8014066755), (-25.5016, 27.1895646266), (-25.5016, 24.5777225776))
            Line((-25.5016, 24.5777225776), (-25.4, 24.4761225776))
            ThreePointArc((-25.4, 24.4761225776), (-22.788157951, 24.4761225776), (-20.1763159021, 24.3324384796))
            Line((-20.1763159021, 24.3324384796), (-20.1763159021, 24.4340384796))
        make_face()
    extrude(amount=F2_T148_DEPTH)

    split(bisect_by=Plane.YZ.offset(-28.7840850651), keep=Keep.TOP)


with BuildPart() as f2_tool150:
    # F2_s151 → F2_t152 (new body)
    with BuildSketch(Plane.XY.offset(41.1977468038)):
        with BuildLine():
            Line((-28.9277691631, -20.1763159021), (-23.5604009672, -25.5436840979))
            Line((-23.5604009672, -25.5436840979), (-23.5604009672, -25.6452840979))
            ThreePointArc((-23.5604009672, -25.6452840979), (-26.1722430162, -25.5016), (-28.7840850651, -25.5016))
            Line((-28.7840850651, -25.5016), (-28.8856850651, -25.4))
            ThreePointArc((-28.8856850651, -25.4), (-28.8856850651, -22.788157951), (-29.0293691631, -20.1763159021))
            Line((-29.0293691631, -20.1763159021), (-28.9277691631, -20.1763159021))
        make_face()
    extrude(amount=-F2_T152_DEPTH)

    split(bisect_by=Plane(origin=(2.8716979706, 0, 24.4093793011), x_dir=(0, 1, 0), z_dir=(0.1168414999, 0, 0.9931505746)), keep=Keep.TOP)


with BuildPart() as f2_tool146_1:
    add(f2_tool146.part)

    # F2_t154: intersect F2_tool150
    add(f2_tool150.part, mode=Mode.INTERSECT)


with BuildPart() as f1_19:
    add(f1_18.part)

    # F2_t144: cut F2_tool146
    add(f2_tool146_1.part, mode=Mode.SUBTRACT)


with BuildPart() as f2_tool157:
    # F2_s158 → F2_t159 (new body)
    with BuildSketch(Plane.XY.offset(41.1977468038)):
        with BuildLine():
            Line((-28.9277691631, -20.1763159021), (-23.5604009672, -25.5436840979))
            Line((-23.5604009672, -25.5436840979), (-23.5604009672, -25.6452840979))
            ThreePointArc((-23.5604009672, -25.6452840979), (-26.1722430162, -25.5016), (-28.7840850651, -25.5016))
            Line((-28.7840850651, -25.5016), (-28.8856850651, -25.4))
            ThreePointArc((-28.8856850651, -25.4), (-28.8856850651, -22.788157951), (-29.0293691631, -20.1763159021))
            Line((-29.0293691631, -20.1763159021), (-28.9277691631, -20.1763159021))
        make_face()
    extrude(amount=-F2_T159_DEPTH)

    split(bisect_by=Plane.XY.offset(19.0267674625), keep=Keep.BOTTOM)


with BuildPart() as f2_tool161:
    # F2_s162 → F2_t163 (new body)
    with BuildSketch(Plane.YZ.offset(-15.7199354863)):
        with BuildLine():
            Line((-20.1763159021, 19.1704515604), (-25.5436840979, 13.8030833646))
            Line((-25.5436840979, 13.8030833646), (-25.6452840979, 13.8030833646))
            ThreePointArc((-25.6452840979, 13.8030833646), (-25.5016, 16.4149254135), (-25.5016, 19.0267674625))
            Line((-25.5016, 19.0267674625), (-25.4, 19.1283674625))
            ThreePointArc((-25.4, 19.1283674625), (-22.788157951, 19.1283674625), (-20.1763159021, 19.2720515604))
            Line((-20.1763159021, 19.2720515604), (-20.1763159021, 19.1704515604))
        make_face()
    extrude(amount=-F2_T163_DEPTH)

    split(bisect_by=Plane.YZ.offset(-28.7840850651), keep=Keep.TOP)


with BuildPart() as f2_tool157_1:
    add(f2_tool157.part)

    # F2_t165: intersect F2_tool161
    add(f2_tool161.part, mode=Mode.INTERSECT)


with BuildPart() as f1_20:
    add(f1_19.part)

    # F2_t155: cut F2_tool157
    add(f2_tool157_1.part, mode=Mode.SUBTRACT)


with BuildPart() as f2_tool168:
    # F2_s169 → F2_t170 (new body)
    with BuildSketch(Plane(origin=(-0.5278624368, 0, 7.3900741156), x_dir=(0, 1, 0), z_dir=(-0.07124705, 0, 0.9974586998))):
        with BuildLine():
            Line((-20.1763159021, 19.4256357085), (-25.5436840979, 24.7930039044))
            Line((-25.5436840979, 24.7930039044), (-25.6452840979, 24.7930039044))
            ThreePointArc((-25.6452840979, 24.7930039044), (-25.5016, 22.1811618554), (-25.5016, 19.5693198065))
            Line((-25.5016, 19.5693198065), (-25.4, 19.4677198065))
            ThreePointArc((-25.4, 19.4677198065), (-22.788157951, 19.4677198065), (-20.1763159021, 19.3240357085))
            Line((-20.1763159021, 19.3240357085), (-20.1763159021, 19.4256357085))
        make_face()
    extrude(amount=F2_T170_DEPTH)

    split(bisect_by=Plane.XY.offset(19.0267674625), keep=Keep.BOTTOM)


with BuildPart() as f2_tool172:
    # F2_s173 → F2_t174 (new body)
    with BuildSketch(Plane.YZ.offset(-13.1723778322)):
        with BuildLine():
            Line((-20.1763159021, 19.1704515604), (-25.5436840979, 13.8030833646))
            Line((-25.5436840979, 13.8030833646), (-25.6452840979, 13.8030833646))
            ThreePointArc((-25.6452840979, 13.8030833646), (-25.5016, 16.4149254135), (-25.5016, 19.0267674625))
            Line((-25.5016, 19.0267674625), (-25.4, 19.1283674625))
            ThreePointArc((-25.4, 19.1283674625), (-22.788157951, 19.1283674625), (-20.1763159021, 19.2720515604))
            Line((-20.1763159021, 19.2720515604), (-20.1763159021, 19.1704515604))
        make_face()
    extrude(amount=-F2_T174_DEPTH)

    split(bisect_by=Plane(origin=(-19.5195882907, 0, -1.3942563065), x_dir=(0, 1, 0), z_dir=(-0.9974586998, 0, -0.07124705)), keep=Keep.TOP)


with BuildPart() as f2_tool168_1:
    add(f2_tool168.part)

    # F2_t176: intersect F2_tool172
    add(f2_tool172.part, mode=Mode.INTERSECT)


with BuildPart() as f1_21:
    add(f1_20.part)

    # F2_t166: cut F2_tool168
    add(f2_tool168_1.part, mode=Mode.SUBTRACT)


with BuildPart() as f2_tool179:
    # F2_s180 → F2_t181 (new body)
    with BuildSketch(Plane(origin=(-0.5278624368, 0, 7.3900741156), x_dir=(0, 1, 0), z_dir=(-0.07124705, 0, 0.9974586998))):
        with BuildLine():
            Line((-20.1763159021, 19.4256357085), (-25.5436840979, 24.7930039044))
            Line((-25.5436840979, 24.7930039044), (-25.6452840979, 24.7930039044))
            ThreePointArc((-25.6452840979, 24.7930039044), (-25.5016, 22.1811618554), (-25.5016, 19.5693198065))
            Line((-25.5016, 19.5693198065), (-25.4, 19.4677198065))
            ThreePointArc((-25.4, 19.4677198065), (-22.788157951, 19.4677198065), (-20.1763159021, 19.3240357085))
            Line((-20.1763159021, 19.3240357085), (-20.1763159021, 19.4256357085))
        make_face()
    extrude(amount=F2_T181_DEPTH)

    split(bisect_by=Plane.XY.offset(28.133597225), keep=Keep.TOP)


with BuildPart() as f2_tool183:
    # F2_s184 → F2_t185 (new body)
    with BuildSketch(Plane.YZ.offset(-34.6928702647)):
        with BuildLine():
            Line((-20.1763159021, 27.989913127), (-25.5436840979, 33.3572813229))
            Line((-25.5436840979, 33.3572813229), (-25.6452840979, 33.3572813229))
            ThreePointArc((-25.6452840979, 33.3572813229), (-25.5016, 30.7454392739), (-25.5016, 28.133597225))
            Line((-25.5016, 28.133597225), (-25.4, 28.031997225))
            ThreePointArc((-25.4, 28.031997225), (-22.788157951, 28.031997225), (-20.1763159021, 27.888313127))
            Line((-20.1763159021, 27.888313127), (-20.1763159021, 27.989913127))
        make_face()
    extrude(amount=F2_T185_DEPTH)

    split(bisect_by=Plane(origin=(-19.5195882907, 0, -1.3942563065), x_dir=(0, 1, 0), z_dir=(-0.9974586998, 0, -0.07124705)), keep=Keep.TOP)


with BuildPart() as f2_tool179_1:
    add(f2_tool179.part)

    # F2_t187: intersect F2_tool183
    add(f2_tool183.part, mode=Mode.INTERSECT)


with BuildPart() as f1_22:
    add(f1_21.part)

    # F2_t177: cut F2_tool179
    add(f2_tool179_1.part, mode=Mode.SUBTRACT)


with BuildPart() as f2_tool190:
    # F2_s191 → F2_t192 (new body)
    with BuildSketch(Plane.YZ.offset(-34.6928702647)):
        with BuildLine():
            Line((-20.1763159021, 27.989913127), (-25.5436840979, 33.3572813229))
            Line((-25.5436840979, 33.3572813229), (-25.6452840979, 33.3572813229))
            ThreePointArc((-25.6452840979, 33.3572813229), (-25.5016, 30.7454392739), (-25.5016, 28.133597225))
            Line((-25.5016, 28.133597225), (-25.4, 28.031997225))
            ThreePointArc((-25.4, 28.031997225), (-22.788157951, 28.031997225), (-20.1763159021, 27.888313127))
            Line((-20.1763159021, 27.888313127), (-20.1763159021, 27.989913127))
        make_face()
    extrude(amount=F2_T192_DEPTH)

    split(bisect_by=Plane.YZ.offset(-13.1723778322), keep=Keep.TOP)


with BuildPart() as f2_tool194:
    # F2_s195 → F2_t196 (new body)
    with BuildSketch(Plane.XY.offset(41.1977468038)):
        with BuildLine():
            Line((-13.3160619302, -20.1763159021), (-7.9486937343, -25.5436840979))
            Line((-7.9486937343, -25.5436840979), (-7.9486937343, -25.6452840979))
            ThreePointArc((-7.9486937343, -25.6452840979), (-10.5605357833, -25.5016), (-13.1723778322, -25.5016))
            Line((-13.1723778322, -25.5016), (-13.2739778322, -25.4))
            ThreePointArc((-13.2739778322, -25.4), (-13.2739778322, -22.788157951), (-13.4176619302, -20.1763159021))
            Line((-13.4176619302, -20.1763159021), (-13.3160619302, -20.1763159021))
        make_face()
    extrude(amount=-F2_T196_DEPTH)

    split(bisect_by=Plane.XY.offset(28.133597225), keep=Keep.TOP)


with BuildPart() as f2_tool190_1:
    add(f2_tool190.part)

    # F2_t198: intersect F2_tool194
    add(f2_tool194.part, mode=Mode.INTERSECT)


with BuildPart() as f1_23:
    add(f1_22.part)

    # F2_t188: cut F2_tool190
    add(f2_tool190_1.part, mode=Mode.SUBTRACT)


with BuildPart() as f2_tool201:
    # F2_s202 → F2_t203 (new body)
    with BuildSketch(Plane.XY.offset(28.133597225)):
        with BuildLine():
            Line((-13.3160619302, -20.1763159021), (-7.9486937343, -25.5436840979))
            Line((-7.9486937343, -25.5436840979), (-7.9486937343, -25.6452840979))
            ThreePointArc((-7.9486937343, -25.6452840979), (-10.5605357833, -25.5016), (-13.1723778322, -25.5016))
            Line((-13.1723778322, -25.5016), (-13.2739778322, -25.4))
            ThreePointArc((-13.2739778322, -25.4), (-13.2739778322, -22.788157951), (-13.4176619302, -20.1763159021))
            Line((-13.4176619302, -20.1763159021), (-13.3160619302, -20.1763159021))
        make_face()
    extrude(amount=-F2_T203_DEPTH)

    split(bisect_by=Plane.XY.offset(19.0267674625), keep=Keep.BOTTOM)


with BuildPart() as f2_tool205:
    # F2_s206 → F2_t207 (new body)
    with BuildSketch(Plane.YZ.offset(-0.1082282534)):
        with BuildLine():
            Line((-20.1763159021, 19.1704515604), (-25.5436840979, 13.8030833646))
            Line((-25.5436840979, 13.8030833646), (-25.6452840979, 13.8030833646))
            ThreePointArc((-25.6452840979, 13.8030833646), (-25.5016, 16.4149254135), (-25.5016, 19.0267674625))
            Line((-25.5016, 19.0267674625), (-25.4, 19.1283674625))
            ThreePointArc((-25.4, 19.1283674625), (-22.788157951, 19.1283674625), (-20.1763159021, 19.2720515604))
            Line((-20.1763159021, 19.2720515604), (-20.1763159021, 19.1704515604))
        make_face()
    extrude(amount=-F2_T207_DEPTH)

    split(bisect_by=Plane.YZ.offset(-13.1723778322), keep=Keep.TOP)


with BuildPart() as f2_tool201_1:
    add(f2_tool201.part)

    # F2_t209: intersect F2_tool205
    add(f2_tool205.part, mode=Mode.INTERSECT)


with BuildPart() as f1_24:
    add(f1_23.part)

    # F2_t199: cut F2_tool201
    add(f2_tool201_1.part, mode=Mode.SUBTRACT)

    # F3 (on Front) → F4 (join)
    with BuildSketch(Plane.XZ):
        Polygon((-28.458841145, 0), (-28.458841145, -20.3277431428), (-17.4005478621, -19.6772571653), (-17.4005478621, 0), align=None)
        with Locations((-20.4059630632, -8.7298303843)):
            Circle(F3_R, mode=Mode.SUBTRACT)
    extrude(amount=F4_DEPTH)


solid = f1_24.part
